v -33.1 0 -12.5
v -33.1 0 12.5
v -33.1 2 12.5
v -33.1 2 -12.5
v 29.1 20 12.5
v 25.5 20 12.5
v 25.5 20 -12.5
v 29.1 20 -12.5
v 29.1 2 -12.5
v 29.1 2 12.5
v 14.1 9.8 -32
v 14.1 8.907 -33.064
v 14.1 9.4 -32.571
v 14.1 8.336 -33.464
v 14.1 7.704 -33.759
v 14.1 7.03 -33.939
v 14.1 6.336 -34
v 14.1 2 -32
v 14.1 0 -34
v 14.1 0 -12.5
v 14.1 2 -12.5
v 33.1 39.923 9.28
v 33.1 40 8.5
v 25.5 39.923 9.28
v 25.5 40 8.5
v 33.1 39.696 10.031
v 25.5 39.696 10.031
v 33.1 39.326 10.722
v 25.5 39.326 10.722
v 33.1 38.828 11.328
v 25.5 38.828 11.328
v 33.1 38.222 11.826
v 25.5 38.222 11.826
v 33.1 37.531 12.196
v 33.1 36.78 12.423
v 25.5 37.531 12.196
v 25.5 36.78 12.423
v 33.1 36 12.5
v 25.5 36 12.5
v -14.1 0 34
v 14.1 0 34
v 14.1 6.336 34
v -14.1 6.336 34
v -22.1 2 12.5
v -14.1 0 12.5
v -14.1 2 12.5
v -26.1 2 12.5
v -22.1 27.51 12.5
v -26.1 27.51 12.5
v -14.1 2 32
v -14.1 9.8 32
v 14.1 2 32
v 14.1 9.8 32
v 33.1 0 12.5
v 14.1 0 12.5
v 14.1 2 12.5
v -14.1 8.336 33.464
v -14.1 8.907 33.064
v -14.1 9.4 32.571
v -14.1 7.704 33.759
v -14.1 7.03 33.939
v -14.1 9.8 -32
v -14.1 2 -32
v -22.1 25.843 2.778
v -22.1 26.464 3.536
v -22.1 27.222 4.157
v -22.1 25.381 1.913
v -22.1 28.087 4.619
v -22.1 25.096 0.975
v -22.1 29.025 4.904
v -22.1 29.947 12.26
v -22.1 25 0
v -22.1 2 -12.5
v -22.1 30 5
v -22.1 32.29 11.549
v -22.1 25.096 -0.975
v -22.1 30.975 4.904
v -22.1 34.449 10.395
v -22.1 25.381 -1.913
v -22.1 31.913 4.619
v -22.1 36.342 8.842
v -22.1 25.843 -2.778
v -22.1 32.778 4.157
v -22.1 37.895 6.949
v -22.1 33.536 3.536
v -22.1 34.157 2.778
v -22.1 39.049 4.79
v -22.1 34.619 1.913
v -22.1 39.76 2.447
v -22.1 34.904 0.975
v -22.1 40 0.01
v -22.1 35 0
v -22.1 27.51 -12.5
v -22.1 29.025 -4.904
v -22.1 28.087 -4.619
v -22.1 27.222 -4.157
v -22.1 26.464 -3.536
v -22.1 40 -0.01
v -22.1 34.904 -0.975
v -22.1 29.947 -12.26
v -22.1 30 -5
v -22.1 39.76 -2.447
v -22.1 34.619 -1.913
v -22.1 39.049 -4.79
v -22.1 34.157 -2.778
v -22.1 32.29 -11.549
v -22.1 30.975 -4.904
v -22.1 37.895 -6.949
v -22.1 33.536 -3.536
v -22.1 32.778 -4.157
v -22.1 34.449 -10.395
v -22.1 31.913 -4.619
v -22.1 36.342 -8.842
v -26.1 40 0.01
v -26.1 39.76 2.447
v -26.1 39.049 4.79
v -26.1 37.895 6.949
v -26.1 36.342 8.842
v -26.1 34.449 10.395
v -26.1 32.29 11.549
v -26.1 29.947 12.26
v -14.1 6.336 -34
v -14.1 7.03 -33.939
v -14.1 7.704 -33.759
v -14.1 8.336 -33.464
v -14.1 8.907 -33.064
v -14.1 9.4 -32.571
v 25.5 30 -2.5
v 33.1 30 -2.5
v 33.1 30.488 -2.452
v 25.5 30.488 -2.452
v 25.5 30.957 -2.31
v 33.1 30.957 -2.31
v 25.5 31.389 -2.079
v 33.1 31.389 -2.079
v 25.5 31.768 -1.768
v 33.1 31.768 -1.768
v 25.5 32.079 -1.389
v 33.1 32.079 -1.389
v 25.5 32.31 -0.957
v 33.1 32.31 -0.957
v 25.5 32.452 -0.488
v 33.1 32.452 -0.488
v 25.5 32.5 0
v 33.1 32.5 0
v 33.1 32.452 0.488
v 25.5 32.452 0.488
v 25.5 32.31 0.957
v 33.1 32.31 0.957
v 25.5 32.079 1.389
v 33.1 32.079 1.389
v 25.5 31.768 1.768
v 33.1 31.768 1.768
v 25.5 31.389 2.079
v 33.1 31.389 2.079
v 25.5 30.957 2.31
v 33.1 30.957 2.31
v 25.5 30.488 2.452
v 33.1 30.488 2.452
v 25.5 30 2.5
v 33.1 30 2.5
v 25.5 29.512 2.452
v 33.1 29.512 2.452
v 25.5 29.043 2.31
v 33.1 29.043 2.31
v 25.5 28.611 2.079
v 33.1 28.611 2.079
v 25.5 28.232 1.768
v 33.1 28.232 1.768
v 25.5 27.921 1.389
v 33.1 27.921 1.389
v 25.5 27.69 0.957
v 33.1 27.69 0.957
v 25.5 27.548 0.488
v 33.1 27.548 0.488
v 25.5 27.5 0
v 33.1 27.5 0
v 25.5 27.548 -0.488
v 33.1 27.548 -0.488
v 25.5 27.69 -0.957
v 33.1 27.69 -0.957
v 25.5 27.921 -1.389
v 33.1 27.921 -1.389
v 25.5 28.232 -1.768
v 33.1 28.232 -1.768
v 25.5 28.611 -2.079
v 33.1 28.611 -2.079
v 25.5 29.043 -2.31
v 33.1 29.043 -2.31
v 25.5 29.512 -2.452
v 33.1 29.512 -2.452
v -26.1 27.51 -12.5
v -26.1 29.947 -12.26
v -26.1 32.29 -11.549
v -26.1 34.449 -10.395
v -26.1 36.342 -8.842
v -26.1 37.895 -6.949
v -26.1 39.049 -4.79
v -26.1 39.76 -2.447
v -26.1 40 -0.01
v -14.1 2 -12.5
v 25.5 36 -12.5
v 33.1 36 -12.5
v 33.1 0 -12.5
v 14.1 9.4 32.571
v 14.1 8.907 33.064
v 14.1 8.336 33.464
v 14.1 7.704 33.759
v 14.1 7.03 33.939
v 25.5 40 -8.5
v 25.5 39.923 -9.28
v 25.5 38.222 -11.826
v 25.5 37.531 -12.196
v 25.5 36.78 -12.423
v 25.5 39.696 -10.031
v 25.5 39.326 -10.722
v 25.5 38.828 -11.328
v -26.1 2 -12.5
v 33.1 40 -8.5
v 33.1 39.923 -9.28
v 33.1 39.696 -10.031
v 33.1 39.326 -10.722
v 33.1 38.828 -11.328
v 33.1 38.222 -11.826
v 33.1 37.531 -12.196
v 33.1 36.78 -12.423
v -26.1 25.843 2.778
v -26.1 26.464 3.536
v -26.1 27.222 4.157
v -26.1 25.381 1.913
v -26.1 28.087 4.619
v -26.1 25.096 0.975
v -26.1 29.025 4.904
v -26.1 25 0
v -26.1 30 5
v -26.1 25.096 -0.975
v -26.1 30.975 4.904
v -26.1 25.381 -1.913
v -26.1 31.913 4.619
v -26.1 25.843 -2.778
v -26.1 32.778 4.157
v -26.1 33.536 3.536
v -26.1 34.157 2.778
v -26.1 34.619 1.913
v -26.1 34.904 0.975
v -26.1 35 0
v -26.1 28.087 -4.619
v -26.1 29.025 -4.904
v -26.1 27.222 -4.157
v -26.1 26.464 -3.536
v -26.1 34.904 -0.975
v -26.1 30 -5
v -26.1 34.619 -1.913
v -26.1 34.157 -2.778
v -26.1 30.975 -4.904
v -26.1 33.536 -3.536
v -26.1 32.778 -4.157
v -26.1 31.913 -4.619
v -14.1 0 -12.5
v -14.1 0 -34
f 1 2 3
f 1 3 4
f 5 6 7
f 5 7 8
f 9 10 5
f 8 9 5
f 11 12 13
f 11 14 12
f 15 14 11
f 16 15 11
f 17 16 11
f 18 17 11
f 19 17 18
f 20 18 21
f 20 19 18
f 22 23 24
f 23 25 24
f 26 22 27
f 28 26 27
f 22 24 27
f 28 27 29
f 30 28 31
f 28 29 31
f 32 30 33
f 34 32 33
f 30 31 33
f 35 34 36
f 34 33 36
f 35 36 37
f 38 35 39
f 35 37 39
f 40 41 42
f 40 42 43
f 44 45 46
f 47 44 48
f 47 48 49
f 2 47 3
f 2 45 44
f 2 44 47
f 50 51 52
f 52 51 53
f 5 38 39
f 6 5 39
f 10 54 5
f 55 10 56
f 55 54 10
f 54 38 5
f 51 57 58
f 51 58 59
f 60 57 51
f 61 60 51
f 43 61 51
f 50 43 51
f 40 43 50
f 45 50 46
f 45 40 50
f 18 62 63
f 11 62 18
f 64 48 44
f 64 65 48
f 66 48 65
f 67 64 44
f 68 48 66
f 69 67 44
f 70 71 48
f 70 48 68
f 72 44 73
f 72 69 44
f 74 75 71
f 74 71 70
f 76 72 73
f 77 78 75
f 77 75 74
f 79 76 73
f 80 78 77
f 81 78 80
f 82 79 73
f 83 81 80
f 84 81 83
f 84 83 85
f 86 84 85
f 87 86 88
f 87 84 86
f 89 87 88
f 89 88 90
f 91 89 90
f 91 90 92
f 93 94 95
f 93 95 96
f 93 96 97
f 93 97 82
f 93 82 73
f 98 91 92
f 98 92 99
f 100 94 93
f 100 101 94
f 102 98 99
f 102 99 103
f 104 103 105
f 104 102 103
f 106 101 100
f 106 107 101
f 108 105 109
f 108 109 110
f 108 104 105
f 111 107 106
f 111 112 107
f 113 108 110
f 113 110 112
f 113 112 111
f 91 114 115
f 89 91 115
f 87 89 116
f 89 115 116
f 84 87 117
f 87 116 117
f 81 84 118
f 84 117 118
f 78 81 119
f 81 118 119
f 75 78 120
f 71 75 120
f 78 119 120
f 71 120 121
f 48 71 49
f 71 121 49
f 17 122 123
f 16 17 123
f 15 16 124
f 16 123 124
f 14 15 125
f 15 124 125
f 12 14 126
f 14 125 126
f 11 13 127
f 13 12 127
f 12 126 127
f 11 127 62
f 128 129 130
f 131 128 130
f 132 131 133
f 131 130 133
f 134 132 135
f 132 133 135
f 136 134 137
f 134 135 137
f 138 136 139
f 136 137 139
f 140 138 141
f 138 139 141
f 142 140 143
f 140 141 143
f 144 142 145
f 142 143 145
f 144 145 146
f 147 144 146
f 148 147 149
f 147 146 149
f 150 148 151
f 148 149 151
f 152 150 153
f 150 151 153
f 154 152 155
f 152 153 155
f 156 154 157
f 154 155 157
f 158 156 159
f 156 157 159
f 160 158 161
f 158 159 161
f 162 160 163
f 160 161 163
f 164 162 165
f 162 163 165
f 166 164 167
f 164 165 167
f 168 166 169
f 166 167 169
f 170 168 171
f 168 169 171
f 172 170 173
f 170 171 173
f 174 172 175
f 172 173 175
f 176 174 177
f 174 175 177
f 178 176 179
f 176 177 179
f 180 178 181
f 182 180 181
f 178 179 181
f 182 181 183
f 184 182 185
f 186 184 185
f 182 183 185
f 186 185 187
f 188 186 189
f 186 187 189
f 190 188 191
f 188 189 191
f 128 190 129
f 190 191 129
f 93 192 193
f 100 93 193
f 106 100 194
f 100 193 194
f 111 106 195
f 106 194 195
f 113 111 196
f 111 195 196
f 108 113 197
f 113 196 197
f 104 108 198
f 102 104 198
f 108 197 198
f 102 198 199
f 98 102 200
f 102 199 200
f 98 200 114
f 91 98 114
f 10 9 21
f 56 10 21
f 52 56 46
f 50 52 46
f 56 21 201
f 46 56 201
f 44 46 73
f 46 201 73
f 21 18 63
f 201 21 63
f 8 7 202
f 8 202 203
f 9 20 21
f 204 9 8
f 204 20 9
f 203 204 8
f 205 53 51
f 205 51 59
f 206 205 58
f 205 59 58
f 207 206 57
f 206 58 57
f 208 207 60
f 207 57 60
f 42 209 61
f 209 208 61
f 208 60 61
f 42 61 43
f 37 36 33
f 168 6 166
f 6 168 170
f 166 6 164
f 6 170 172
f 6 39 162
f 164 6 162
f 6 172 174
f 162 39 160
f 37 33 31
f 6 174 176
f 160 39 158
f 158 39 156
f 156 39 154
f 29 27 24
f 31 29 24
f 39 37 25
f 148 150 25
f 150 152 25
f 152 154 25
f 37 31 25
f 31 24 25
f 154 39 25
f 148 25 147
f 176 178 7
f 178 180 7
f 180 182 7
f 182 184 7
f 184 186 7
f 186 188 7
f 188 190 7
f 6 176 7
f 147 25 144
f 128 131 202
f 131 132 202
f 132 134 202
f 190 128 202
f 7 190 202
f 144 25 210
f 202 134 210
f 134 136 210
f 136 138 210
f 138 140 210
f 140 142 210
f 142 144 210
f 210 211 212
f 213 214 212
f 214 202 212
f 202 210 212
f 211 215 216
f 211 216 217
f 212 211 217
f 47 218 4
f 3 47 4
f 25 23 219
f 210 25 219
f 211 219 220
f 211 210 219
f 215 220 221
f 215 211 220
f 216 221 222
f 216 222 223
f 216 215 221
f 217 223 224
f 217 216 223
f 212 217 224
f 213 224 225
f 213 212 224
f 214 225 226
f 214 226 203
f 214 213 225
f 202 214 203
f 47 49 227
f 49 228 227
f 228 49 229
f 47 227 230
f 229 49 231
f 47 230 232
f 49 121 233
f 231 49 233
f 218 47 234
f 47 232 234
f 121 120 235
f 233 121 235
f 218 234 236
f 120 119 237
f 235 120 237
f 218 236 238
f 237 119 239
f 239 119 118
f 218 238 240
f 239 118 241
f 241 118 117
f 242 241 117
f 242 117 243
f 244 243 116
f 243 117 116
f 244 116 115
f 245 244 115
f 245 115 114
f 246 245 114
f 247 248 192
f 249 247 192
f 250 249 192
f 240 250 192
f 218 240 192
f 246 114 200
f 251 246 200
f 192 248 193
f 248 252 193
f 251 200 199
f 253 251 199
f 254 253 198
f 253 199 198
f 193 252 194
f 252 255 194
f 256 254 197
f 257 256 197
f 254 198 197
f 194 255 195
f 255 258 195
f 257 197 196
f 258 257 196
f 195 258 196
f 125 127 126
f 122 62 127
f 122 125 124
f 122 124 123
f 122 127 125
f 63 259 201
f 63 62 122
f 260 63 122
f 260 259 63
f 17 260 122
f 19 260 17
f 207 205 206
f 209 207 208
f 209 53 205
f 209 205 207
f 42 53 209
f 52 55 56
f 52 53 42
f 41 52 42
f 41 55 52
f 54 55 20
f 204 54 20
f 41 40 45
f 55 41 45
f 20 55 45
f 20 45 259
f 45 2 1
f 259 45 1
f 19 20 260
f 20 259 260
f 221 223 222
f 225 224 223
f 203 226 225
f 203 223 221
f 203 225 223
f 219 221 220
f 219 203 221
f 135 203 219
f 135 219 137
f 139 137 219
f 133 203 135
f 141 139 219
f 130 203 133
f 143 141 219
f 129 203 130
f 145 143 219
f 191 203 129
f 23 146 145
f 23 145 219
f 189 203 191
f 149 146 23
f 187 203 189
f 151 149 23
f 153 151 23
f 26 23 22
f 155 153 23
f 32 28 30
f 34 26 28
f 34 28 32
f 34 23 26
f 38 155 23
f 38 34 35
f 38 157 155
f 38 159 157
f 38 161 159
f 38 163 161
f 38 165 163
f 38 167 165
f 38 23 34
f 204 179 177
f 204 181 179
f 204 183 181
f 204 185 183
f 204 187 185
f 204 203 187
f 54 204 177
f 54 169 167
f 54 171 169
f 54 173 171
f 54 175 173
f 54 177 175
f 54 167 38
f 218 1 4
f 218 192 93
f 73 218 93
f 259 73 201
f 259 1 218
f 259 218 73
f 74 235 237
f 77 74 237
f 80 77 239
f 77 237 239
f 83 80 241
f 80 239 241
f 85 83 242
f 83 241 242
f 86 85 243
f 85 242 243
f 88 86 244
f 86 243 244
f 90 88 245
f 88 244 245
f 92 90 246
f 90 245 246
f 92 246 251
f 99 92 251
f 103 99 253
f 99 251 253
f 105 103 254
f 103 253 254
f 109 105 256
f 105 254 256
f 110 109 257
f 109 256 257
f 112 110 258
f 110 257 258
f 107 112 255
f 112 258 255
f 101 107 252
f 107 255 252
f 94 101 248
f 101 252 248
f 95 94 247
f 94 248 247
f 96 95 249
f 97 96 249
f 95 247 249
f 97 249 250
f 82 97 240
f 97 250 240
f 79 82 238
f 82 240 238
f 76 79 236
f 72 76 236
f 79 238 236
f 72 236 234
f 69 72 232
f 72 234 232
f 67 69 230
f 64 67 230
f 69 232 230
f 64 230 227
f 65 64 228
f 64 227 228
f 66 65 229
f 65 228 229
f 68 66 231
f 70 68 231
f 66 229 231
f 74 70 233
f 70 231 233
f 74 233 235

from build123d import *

# Parameters (mm, degrees)
BOSS_EXTRUDE1_DEPTH  = 2
SKETCH2_W            = 28.2
SKETCH2_H            = 9.8
BOSS_EXTRUDE2_DEPTH  = 2
FILLET1_R            = 4
FILLET1_OF_MIRROR2_R = 4
SKETCH3_W            = 25
SKETCH3_H            = 40
SKETCH3_R            = 2.5
BOSS_EXTRUDE3_DEPTH  = 7.6
FILLET2_R            = 4
CUT_EXTRUDE1_REACH   = 71.698
SKETCH4_W            = 3.6
SKETCH4_H            = 18
SKETCH5_R            = 5
BOSS_EXTRUDE4_DEPTH  = 4


with BuildPart() as part:
    # Sketch1 → Boss-Extrude1 (new body)
    with BuildSketch(Plane(origin=(0, 0, 0), x_dir=(1, 0, 0), z_dir=(0, 1, 0))):
        Polygon((-14.1, 12.5), (-14.1, 34), (14.1, 34), (14.1, 12.5), (33.1, 12.5), (33.1, -12.5), (14.1, -12.5), (14.1, -34), (-14.1, -34), (-14.1, -12.5), (-33.1, -12.5), (-33.1, 12.5), align=None)
    boss_extrude1 = extrude(amount=BOSS_EXTRUDE1_DEPTH)

    # Sketch2 → Boss-Extrude2 (add)
    with BuildSketch(Plane.XY.offset(34)):
        with Locations((0, 4.9)):
            Rectangle(SKETCH2_W, SKETCH2_H)
    boss_extrude2 = extrude(amount=-BOSS_EXTRUDE2_DEPTH)

    # Fillet1
    # the kernel refuses this fillet: 4 mm, written as the material it takes off along each edge
    with BuildSketch(Plane(origin=(-22.760254038, 9.8, 34), x_dir=(0, -1, 0), z_dir=(1, 0, 0))) as fillet1_piece_1:
        with BuildLine():
            CenterArc((3.464101615, 4), FILLET1_R, 210, 60)
            Line((0, 2), (-0.069282032, 1.96))
            ThreePointArc((-0.069282032, 1.96), (-0.08, 1), (-0.08, 0))
            Line((-0.08, 0), (0, -0.08))
            Line((0, -0.08), (3.464101615, -0.08))
            Line((3.464101615, -0.08), (3.464101615, 0))
        make_face()
    extrude(amount=45.520508076, mode=Mode.SUBTRACT)

    # Mirror2: Boss-Extrude1, Boss-Extrude2 across plane
    add(boss_extrude1.mirror(Plane.XY))
    add(boss_extrude2.mirror(Plane.XY))

    # Fillet1 of Mirror2
    # the kernel refuses this fillet: 4 mm, written as the material it takes off along each edge
    with BuildSketch(Plane(origin=(-22.760254038, 9.8, -34), x_dir=(0, -1, 0), z_dir=(1, 0, 0))) as fillet1_of_mirror2_piece_1:
        with BuildLine():
            CenterArc((3.464101615, -4), FILLET1_OF_MIRROR2_R, 90, 60)
            Line((0, -2), (-0.069282032, -1.96))
            ThreePointArc((-0.069282032, -1.96), (-0.08, -1), (-0.08, 0))
            Line((-0.08, 0), (0, 0.08))
            Line((0, 0.08), (3.464101615, 0.08))
            Line((3.464101615, 0.08), (3.464101615, 0))
        make_face()
    extrude(amount=45.520508076, mode=Mode.SUBTRACT)

    # Sketch3 → Boss-Extrude3 (add)
    with BuildSketch(Plane(origin=(33.1, 0, 0), x_dir=(0, 0, -1), z_dir=(1, 0, 0))):
        with Locations((0, 20)):
            Rectangle(SKETCH3_W, SKETCH3_H)
        with Locations((0, 30)):
            Circle(SKETCH3_R, mode=Mode.SUBTRACT)
    extrude(amount=-BOSS_EXTRUDE3_DEPTH)

    # Fillet2
    fillet2_edges = [part.edges().sort_by_distance(p)[0] for p in [
        (29.3, 40, -12.5),
        (29.3, 40, 12.5),
    ]]
    fillet(fillet2_edges, radius=FILLET2_R)

    # Sketch4 → Cut-Extrude1 (cut, up to next)
    with BuildSketch(Plane.XY.offset(12.5), mode=Mode.PRIVATE) as cut_extrude1_sk1:
        with Locations((27.3, 11)):
            Rectangle(SKETCH4_W, SKETCH4_H)
    cut_extrude1_tool1 = extrude(cut_extrude1_sk1.sketch, amount=-CUT_EXTRUDE1_REACH, mode=Mode.PRIVATE) & part.part
    add(cut_extrude1_tool1.solids().sort_by_distance((27.3, 11, 12.5))[0], mode=Mode.SUBTRACT)

    # Sketch5 → Boss-Extrude4 (add)
    with BuildSketch(Plane.ZY.offset(26.1)):
        with BuildLine():
            Line((12.5, 0), (-12.5, 0))
            Line((-12.5, 0), (-12.5, 27.51))
            ThreePointArc((-12.5, 27.51), (-8.841763697, 36.341763697), (-0.01, 40))
            Line((-0.01, 40), (0.01, 40))
            ThreePointArc((0.01, 40), (8.841763697, 36.341763697), (12.5, 27.51))
            Line((12.5, 27.51), (12.5, 0))
        make_face()
        with Locations((0, 30)):
            Circle(SKETCH5_R, mode=Mode.SUBTRACT)
    extrude(amount=-BOSS_EXTRUDE4_DEPTH)


solid = part.part
